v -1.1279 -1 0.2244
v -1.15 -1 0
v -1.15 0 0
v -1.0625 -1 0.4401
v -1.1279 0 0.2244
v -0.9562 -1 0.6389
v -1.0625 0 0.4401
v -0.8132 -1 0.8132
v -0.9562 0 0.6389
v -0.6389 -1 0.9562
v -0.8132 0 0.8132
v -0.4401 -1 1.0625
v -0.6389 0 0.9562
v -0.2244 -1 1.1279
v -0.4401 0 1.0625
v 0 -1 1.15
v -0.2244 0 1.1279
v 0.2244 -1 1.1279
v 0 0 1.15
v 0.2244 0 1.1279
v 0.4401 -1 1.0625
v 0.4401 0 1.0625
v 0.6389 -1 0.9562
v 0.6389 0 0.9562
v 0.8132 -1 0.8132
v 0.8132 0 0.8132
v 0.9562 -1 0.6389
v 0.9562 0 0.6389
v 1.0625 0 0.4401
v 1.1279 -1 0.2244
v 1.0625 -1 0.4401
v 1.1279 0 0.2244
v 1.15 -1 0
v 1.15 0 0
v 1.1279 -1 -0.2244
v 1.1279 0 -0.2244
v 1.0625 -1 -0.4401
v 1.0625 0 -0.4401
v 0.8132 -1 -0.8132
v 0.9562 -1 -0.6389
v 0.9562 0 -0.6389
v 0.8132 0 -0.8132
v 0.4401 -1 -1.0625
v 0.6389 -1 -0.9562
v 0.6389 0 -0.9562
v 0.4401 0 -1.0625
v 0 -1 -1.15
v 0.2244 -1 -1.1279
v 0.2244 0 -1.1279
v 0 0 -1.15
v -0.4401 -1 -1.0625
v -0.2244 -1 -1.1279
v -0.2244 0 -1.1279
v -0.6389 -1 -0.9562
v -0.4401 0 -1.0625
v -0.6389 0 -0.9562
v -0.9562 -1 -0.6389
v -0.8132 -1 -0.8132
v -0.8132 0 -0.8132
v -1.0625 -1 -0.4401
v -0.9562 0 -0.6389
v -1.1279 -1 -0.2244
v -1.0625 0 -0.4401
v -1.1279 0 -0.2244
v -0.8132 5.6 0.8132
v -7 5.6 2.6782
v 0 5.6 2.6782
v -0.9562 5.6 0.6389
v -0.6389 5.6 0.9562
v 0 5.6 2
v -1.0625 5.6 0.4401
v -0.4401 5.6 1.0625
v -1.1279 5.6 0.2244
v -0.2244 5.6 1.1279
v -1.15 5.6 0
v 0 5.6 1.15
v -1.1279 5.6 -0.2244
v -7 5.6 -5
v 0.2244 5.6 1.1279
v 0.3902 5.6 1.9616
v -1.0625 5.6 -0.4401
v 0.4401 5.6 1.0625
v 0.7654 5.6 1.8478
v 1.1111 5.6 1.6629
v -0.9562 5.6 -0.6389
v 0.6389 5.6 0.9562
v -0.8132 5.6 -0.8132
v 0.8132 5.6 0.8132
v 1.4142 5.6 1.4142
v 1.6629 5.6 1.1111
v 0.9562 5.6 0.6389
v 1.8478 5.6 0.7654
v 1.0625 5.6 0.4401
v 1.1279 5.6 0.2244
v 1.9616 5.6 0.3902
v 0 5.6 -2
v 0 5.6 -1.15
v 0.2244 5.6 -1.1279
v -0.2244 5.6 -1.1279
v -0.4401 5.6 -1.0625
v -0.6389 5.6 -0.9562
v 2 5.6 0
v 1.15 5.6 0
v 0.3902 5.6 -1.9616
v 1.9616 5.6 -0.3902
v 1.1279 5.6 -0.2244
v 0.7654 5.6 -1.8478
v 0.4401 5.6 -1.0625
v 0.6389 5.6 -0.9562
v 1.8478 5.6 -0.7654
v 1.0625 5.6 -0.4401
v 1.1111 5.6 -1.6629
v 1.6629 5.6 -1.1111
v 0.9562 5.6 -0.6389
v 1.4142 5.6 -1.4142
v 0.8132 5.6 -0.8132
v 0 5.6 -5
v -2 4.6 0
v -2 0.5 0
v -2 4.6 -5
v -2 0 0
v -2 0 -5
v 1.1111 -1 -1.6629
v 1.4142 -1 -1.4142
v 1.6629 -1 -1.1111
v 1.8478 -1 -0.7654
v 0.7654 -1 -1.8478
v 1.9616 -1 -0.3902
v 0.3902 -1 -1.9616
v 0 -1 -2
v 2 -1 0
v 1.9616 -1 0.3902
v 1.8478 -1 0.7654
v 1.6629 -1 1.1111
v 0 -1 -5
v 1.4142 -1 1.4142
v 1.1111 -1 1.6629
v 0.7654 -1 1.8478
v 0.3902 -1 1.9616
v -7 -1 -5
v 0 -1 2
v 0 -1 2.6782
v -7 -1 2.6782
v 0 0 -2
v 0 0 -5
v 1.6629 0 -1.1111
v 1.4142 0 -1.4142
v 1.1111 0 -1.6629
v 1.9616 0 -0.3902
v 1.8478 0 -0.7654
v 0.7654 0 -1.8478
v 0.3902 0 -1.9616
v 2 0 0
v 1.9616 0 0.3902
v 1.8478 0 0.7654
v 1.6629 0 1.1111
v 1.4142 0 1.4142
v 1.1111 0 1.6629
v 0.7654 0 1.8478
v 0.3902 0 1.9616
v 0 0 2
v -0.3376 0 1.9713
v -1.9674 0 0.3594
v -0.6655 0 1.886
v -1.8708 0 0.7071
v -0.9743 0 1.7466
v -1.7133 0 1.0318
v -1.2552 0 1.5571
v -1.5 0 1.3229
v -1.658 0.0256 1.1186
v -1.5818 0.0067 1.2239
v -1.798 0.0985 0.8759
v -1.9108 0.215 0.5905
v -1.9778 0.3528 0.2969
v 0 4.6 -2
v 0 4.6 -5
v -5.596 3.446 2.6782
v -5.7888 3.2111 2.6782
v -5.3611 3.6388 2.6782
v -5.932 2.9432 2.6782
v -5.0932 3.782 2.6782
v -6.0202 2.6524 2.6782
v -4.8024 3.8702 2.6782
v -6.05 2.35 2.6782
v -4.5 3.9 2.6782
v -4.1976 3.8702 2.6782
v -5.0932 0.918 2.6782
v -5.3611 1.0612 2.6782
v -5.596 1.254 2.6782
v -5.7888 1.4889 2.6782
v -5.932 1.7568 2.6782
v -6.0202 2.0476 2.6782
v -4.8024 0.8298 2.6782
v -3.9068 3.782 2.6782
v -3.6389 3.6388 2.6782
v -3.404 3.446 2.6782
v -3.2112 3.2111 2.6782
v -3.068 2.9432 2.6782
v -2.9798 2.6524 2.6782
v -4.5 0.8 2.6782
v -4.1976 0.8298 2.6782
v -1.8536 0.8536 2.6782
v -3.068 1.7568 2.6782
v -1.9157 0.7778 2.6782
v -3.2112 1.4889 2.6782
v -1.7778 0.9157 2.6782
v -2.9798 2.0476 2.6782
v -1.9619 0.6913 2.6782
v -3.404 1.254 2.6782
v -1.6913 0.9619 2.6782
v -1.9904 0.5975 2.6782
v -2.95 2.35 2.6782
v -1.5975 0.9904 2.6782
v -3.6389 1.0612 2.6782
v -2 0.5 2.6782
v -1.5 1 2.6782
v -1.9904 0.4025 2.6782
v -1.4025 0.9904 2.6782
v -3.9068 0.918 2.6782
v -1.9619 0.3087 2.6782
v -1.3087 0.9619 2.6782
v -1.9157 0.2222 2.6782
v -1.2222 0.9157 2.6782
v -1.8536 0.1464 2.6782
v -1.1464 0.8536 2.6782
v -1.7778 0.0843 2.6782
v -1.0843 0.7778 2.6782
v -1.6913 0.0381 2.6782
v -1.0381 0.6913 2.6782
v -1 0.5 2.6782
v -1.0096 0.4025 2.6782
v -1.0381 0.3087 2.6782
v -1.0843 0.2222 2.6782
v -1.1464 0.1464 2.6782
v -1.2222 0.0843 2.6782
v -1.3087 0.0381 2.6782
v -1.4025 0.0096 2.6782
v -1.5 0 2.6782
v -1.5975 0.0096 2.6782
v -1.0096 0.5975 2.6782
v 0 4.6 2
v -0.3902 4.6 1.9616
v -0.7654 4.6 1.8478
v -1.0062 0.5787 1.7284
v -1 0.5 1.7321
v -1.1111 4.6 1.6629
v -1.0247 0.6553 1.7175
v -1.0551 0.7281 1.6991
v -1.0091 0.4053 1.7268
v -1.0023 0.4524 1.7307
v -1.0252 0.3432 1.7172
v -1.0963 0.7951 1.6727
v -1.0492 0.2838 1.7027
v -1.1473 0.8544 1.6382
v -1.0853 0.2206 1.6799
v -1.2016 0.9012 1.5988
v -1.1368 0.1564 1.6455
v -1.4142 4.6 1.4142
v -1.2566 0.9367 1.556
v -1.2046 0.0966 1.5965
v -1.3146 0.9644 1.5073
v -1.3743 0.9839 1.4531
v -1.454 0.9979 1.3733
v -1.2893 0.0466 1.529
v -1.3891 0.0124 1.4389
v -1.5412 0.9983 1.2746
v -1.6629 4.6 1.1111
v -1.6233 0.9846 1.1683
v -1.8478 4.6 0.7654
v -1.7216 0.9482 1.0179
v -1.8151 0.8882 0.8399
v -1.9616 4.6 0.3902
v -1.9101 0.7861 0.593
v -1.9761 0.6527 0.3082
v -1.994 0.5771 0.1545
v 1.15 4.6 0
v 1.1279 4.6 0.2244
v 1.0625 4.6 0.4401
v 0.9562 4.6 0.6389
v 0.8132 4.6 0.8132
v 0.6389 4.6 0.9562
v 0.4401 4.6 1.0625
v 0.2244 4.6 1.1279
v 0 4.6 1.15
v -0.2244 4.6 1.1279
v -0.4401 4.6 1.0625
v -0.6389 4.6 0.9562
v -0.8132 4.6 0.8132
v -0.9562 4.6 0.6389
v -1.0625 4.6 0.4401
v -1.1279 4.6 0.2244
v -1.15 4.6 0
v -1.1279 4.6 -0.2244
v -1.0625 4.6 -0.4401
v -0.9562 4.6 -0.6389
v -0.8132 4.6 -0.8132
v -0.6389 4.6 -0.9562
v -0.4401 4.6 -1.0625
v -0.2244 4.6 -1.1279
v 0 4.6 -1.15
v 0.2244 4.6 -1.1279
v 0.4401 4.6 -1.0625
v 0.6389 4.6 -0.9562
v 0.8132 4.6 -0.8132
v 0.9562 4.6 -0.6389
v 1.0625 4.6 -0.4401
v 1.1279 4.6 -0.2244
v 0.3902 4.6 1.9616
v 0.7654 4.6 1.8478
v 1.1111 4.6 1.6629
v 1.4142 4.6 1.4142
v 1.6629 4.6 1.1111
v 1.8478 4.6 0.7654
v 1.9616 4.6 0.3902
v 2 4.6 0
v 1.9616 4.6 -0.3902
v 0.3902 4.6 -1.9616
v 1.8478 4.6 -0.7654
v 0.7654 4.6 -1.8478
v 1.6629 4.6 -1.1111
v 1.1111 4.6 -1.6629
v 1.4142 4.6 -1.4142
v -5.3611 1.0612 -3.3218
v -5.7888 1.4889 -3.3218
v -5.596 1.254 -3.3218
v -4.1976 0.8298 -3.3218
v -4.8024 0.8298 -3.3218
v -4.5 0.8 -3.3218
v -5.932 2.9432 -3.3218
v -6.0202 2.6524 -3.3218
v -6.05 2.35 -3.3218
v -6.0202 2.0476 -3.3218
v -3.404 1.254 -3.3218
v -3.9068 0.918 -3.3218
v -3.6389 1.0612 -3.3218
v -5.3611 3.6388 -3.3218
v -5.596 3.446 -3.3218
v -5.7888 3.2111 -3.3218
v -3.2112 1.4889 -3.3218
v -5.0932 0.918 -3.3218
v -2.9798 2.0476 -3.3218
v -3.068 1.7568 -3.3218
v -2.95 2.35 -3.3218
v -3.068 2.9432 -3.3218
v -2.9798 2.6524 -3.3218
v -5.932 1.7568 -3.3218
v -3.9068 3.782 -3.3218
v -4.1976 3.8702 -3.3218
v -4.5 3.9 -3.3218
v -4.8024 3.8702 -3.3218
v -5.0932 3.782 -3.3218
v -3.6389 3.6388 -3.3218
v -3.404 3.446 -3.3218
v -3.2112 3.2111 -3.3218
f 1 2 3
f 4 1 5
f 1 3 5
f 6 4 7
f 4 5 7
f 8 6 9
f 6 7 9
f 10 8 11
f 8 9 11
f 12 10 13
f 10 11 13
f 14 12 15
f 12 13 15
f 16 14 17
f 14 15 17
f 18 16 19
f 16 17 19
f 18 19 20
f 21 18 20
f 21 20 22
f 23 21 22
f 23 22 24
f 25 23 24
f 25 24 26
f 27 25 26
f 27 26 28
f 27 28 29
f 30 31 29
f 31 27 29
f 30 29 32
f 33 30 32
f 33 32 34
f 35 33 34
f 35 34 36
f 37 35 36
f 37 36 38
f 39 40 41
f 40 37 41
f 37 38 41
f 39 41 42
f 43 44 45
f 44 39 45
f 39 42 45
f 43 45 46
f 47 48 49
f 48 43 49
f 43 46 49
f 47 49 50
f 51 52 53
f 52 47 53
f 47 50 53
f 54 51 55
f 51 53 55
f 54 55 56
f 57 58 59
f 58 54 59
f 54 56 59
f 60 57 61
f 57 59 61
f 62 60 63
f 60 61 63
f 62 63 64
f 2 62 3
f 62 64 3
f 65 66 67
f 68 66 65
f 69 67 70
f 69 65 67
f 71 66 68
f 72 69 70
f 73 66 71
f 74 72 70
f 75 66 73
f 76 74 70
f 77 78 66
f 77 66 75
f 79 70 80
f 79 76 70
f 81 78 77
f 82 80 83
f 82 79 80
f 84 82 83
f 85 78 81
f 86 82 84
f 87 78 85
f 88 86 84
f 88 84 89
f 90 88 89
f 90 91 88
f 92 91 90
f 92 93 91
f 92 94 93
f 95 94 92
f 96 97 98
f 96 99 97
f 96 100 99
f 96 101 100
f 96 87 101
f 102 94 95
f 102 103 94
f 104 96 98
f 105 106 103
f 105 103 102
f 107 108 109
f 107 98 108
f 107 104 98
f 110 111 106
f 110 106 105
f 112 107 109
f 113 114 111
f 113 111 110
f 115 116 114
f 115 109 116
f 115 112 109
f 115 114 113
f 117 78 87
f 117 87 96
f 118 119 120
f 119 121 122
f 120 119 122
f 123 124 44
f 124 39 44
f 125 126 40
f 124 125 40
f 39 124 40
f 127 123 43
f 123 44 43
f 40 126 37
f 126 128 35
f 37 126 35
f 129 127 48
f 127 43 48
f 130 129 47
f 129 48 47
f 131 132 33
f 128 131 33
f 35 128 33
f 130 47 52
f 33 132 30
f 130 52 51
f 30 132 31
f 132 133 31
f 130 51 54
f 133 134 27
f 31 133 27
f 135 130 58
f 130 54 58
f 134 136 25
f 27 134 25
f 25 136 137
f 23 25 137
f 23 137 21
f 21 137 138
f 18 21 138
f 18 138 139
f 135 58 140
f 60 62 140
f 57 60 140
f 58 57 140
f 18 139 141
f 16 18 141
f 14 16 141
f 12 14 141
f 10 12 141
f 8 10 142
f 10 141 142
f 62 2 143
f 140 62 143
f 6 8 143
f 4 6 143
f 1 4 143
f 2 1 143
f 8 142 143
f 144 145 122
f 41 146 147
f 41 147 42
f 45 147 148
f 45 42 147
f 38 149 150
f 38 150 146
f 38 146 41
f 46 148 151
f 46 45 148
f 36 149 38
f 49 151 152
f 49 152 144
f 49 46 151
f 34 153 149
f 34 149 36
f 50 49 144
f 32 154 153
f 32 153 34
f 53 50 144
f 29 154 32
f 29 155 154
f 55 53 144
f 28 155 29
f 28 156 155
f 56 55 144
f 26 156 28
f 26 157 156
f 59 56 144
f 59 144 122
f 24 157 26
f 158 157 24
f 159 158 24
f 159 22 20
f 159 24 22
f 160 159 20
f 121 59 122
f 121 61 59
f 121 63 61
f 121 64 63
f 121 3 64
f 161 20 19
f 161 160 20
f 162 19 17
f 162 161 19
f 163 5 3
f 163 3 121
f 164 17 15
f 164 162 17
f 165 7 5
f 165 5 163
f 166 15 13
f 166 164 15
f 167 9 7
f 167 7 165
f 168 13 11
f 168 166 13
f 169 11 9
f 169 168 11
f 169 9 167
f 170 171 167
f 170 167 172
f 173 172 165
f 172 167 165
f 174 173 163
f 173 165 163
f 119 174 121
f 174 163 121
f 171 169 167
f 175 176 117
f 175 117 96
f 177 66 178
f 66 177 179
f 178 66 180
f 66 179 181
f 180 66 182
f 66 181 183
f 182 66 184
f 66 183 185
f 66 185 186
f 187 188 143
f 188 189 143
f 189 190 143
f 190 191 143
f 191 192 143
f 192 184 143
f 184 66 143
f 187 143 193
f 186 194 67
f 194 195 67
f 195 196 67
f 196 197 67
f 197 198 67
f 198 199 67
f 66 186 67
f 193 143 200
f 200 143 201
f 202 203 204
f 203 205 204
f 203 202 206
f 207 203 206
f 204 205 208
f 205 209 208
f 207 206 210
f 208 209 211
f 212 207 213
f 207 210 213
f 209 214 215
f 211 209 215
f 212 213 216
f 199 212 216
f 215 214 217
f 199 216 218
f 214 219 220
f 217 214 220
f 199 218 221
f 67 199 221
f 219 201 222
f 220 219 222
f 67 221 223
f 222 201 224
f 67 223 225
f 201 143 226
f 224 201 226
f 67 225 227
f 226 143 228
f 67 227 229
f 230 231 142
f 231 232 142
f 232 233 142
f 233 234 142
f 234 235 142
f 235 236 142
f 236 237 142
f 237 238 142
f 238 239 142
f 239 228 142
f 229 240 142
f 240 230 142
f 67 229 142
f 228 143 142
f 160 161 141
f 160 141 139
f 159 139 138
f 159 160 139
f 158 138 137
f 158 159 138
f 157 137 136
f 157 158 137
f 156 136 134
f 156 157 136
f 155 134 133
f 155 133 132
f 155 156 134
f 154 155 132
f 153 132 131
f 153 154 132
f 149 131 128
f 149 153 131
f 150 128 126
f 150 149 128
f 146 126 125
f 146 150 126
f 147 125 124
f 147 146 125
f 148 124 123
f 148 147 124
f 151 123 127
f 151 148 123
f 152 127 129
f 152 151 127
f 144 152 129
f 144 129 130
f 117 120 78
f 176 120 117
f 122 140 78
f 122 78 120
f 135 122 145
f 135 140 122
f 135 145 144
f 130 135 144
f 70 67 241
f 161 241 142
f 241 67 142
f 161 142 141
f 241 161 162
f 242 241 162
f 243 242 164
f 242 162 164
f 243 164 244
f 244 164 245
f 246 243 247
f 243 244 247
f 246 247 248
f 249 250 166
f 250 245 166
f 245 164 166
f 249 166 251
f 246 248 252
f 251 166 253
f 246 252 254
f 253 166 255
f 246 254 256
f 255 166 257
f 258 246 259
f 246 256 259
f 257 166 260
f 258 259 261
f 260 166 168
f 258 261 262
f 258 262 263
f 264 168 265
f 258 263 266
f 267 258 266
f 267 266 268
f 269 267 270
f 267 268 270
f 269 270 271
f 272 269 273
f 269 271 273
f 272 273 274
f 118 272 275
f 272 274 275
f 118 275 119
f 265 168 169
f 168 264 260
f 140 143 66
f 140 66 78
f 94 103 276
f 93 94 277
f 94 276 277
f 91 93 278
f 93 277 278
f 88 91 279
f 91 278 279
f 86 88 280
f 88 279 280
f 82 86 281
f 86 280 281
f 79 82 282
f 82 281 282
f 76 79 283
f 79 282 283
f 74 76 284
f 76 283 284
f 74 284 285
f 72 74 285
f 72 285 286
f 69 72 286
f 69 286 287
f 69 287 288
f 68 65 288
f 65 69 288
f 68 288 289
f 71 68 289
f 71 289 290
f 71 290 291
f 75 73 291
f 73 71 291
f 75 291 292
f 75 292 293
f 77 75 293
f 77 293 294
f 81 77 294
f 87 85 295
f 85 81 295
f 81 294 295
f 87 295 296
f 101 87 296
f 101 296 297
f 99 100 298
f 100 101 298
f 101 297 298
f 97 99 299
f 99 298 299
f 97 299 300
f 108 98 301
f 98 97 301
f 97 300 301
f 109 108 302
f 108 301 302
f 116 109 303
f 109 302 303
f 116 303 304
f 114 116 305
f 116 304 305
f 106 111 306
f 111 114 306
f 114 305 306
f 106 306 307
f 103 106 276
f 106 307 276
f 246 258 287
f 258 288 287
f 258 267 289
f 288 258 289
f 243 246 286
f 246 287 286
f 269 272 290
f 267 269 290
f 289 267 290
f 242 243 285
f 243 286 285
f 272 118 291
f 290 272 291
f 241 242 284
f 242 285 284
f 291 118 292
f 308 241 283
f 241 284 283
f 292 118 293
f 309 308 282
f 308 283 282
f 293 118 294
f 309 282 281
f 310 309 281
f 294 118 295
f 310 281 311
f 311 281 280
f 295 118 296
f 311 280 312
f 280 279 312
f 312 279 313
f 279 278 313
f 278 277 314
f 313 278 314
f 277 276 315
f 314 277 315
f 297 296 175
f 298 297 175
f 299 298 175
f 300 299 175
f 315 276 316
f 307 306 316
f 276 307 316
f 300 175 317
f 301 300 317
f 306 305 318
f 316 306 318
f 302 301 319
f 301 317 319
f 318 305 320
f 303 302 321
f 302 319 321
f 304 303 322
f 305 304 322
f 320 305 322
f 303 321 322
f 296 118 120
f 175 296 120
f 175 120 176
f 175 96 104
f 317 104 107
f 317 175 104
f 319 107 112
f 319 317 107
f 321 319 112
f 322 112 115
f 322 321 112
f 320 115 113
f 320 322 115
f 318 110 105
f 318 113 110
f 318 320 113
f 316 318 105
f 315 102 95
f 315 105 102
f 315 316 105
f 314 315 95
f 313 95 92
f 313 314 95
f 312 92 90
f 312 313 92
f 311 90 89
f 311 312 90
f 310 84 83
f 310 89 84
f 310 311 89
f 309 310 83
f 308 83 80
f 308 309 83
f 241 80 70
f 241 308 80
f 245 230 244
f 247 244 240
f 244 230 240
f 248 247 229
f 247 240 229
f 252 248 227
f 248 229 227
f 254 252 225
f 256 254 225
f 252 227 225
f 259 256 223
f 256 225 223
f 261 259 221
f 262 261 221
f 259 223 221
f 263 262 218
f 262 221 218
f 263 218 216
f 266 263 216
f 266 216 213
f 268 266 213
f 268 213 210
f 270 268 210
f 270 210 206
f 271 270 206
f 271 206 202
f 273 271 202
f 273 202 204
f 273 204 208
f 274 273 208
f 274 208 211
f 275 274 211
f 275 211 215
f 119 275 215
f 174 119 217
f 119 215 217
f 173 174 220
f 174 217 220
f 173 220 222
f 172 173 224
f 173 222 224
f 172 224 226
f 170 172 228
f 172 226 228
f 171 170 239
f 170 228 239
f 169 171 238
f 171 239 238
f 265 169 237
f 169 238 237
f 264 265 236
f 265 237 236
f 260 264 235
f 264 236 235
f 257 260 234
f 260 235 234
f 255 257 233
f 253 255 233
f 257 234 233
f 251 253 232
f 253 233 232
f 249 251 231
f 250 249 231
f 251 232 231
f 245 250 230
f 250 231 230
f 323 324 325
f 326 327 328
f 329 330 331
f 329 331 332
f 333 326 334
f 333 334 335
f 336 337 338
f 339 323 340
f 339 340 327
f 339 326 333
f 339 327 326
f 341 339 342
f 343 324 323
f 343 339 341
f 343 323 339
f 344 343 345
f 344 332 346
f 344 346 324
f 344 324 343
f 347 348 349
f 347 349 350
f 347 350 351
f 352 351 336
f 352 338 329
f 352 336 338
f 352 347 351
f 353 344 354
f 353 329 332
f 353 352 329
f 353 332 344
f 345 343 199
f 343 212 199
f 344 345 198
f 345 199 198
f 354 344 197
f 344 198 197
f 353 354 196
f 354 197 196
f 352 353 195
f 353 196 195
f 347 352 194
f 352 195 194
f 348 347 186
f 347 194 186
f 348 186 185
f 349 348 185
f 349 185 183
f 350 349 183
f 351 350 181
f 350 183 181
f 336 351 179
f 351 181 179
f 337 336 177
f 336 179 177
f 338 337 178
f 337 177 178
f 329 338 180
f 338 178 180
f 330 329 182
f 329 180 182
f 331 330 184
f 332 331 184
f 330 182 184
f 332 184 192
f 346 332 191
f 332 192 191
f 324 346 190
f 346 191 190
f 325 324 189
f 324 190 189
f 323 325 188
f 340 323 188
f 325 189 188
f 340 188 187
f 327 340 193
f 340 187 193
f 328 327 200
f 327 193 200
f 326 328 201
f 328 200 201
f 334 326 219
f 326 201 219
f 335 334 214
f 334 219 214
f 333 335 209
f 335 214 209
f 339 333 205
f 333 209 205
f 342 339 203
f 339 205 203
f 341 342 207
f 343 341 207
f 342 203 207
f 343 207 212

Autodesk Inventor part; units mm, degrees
ref_plane "YZ Plane" through (0, 0, 0) normal (1, 0, 0) x (0, 1, 0)
ref_plane "XZ Plane" through (0, 0, 0) normal (0, 1, 0) x (-1, 0, 0)
ref_plane "XY Plane" through (0, 0, 0) normal (0, 0, 1) x (1, 0, 0)
sketch "スケッチ1" plane through (0, 0, 0) normal (0, 1, 0) x (-1, 0, 0)
  circle A0 centre (0, 0) radius 2
  circle A1 centre (0, 0) radius 1.15
  line L0 (0, 0) -> (2, 0)
  line L1 (2, 0) -> (2, -5)
  line L2 (2, -5) -> (0, -5)
  line L3 (0, -5) -> (0, 0)
  line L4 (0, 0) -> (2, 0)
  line L5 (2, 0) -> (2, 4)
  line L6 (2, 4) -> (0, 4)
  line L7 (0, 4) -> (0, 0)
  circle A2 centre (0, 0) radius 3
  circle A3 centre (0, 0) radius 2.5
  line L8 (0, 0) -> (2.5, 0)
  line L9 (2.5, 0) -> (2.5, 2.6782)
  line L10 (2.5, 2.6782) -> (0, 2.6782)
  line L11 (0, 2.6782) -> (0, 0)
  line L12 (0, 2.6782) -> (7, 2.6782)
  line L13 (7, 2.6782) -> (7, -5)
  line L14 (7, -5) -> (0, -5)
  line L15 (0, -5) -> (0, 2.6782)
  point P0 (0, 2)
  point P1 (0, -2)
  dimension "d0" = 4
  dimension "d1" = 2.3
  dimension "d2" = 5
  dimension "d3" = 4
  dimension "d4" = 6
  dimension "d6" = 5
  dimension "d7" = 2.5
  dimension "d8" = 7
sketch "スケッチ2" plane through (0, 0, 0) normal (0, 1, 0) x (-1, 0, 0)
  line L0 (0, -1.1495) -> (-5, -1.1495)
  line L1 (-5, -1.1495) -> (-5, -1.9793)
  line L2 (-5, -1.9793) -> (0, -1.9793)
  line L3 (0, -1.9793) -> (0, -1.1495)
  line L4 (-5, -1.9793) -> (-6.828, -1.9793)
  line L5 (-6.828, -1.9793) -> (-6.828, 0)
  line L6 (-6.828, 0) -> (-5, 0)
  line L7 (-5, 0) -> (-5, -1.9793)
  line L8 (0, 1.115) -> (-6.6551, 1.115)
  line L9 (-6.6551, 1.115) -> (-6.6551, 1.9793)
  line L10 (-6.6551, 1.9793) -> (0, 1.9793)
  line L11 (0, 1.9793) -> (0, 1.115)
  point P0 (0, 0)
  dimension "d5" = 5
extrude "押し出し1" add sketch "スケッチ1" along normal blind 4.6 contours L8 A3 L1 | A0 L7 A3 L5 | L5 A3 L8 | A3 L9 A2 L1 | A3 L7 L10 A2 L5 | L5 A2 L9 A3 | A2 L9 L12 L13 L14 L1 | A2 L10 L5 | L5 L10 L9 A2
extrude "押し出し2" add sketch "スケッチ1" against normal blind 1 contours L0 A1 L7 A0 | L1 A3 L3 A0 | A0 L3 A1 L0 | L8 A3 L1 | A0 L7 A3 L5 | L5 A3 L8 | L7 A1 L3 A0 | A3 L9 A2 L1 | L1 A2 L3 A3 | A3 L7 L10 A2 L5 | L5 A2 L9 A3 | A2 L9 L12 L13 L14 L1 | L1 L2 L3 A2 | A2 L10 L5 | L5 L10 L9 A2
sketch "スケッチ3" plane through (0, 4.6, 0) normal (0, 1, 0) x (1, 0, 0)
  circle A0 centre (0, 0) radius 1.15
  line L0 (-2, 0) -> (-2, 5) projected
  circle A1 centre (0, 0) radius 2
  line L1 (0, -2) -> (0, -2.6782) projected
  line L2 (-7, 5) -> (0, 5) projected
  line L3 (0, -2.6782) -> (-7, -2.6782)
  line L4 (-7, -2.6782) -> (-7, 5)
  line L5 (-7, 5) -> (0, 5)
  line L6 (0, 5) -> (0, -2.6782)
  point P0 (0, 2)
extrude "押し出し3" add sketch "スケッチ3" along normal blind 1 contours A0 L6 A1 | A0 L6 A1 | A1 L0 L2 L6 | L1 L3 L4 L2 L0 A1
sketch "スケッチ4" plane through (-7, -1, 2.6782) normal (0, 0, 1) x (1, 0, 0)
  line L0 (7, 6.6) -> (0, 6.6) projected
  line L1 (0, 6.6) -> (2.5, 6.6)
  line L2 (2.5, 6.6) -> (2.5, 3.35)
  line L3 (2.5, 3.35) -> (0, 3.35)
  line L4 (0, 3.35) -> (0, 6.6)
  circle A0 centre (2.5, 3.35) radius 1.55
  line L5 (5, 1) -> (7, 1) projected
  line L6 (7, 1) -> (5.5, 1)
  line L7 (5.5, 1) -> (5.5, 1.5)
  line L8 (5.5, 1.5) -> (7, 1.5)
  line L9 (7, 1.5) -> (7, 1)
  circle A1 centre (5.5, 1.5) radius 0.5
  dimension "d15" = 2.5
  dimension "d16" = 3.25
  dimension "d17" = 3.1
  dimension "d18" = 1.5
  dimension "d19" = 0.5
extrude "押し出し4" cut sketch "スケッチ4" against normal blind 6 contours A0 L3 L2 | L2 L3 A0 | A1 L8 L7 | L7 L8 A1
properties part number "rod5.0"
